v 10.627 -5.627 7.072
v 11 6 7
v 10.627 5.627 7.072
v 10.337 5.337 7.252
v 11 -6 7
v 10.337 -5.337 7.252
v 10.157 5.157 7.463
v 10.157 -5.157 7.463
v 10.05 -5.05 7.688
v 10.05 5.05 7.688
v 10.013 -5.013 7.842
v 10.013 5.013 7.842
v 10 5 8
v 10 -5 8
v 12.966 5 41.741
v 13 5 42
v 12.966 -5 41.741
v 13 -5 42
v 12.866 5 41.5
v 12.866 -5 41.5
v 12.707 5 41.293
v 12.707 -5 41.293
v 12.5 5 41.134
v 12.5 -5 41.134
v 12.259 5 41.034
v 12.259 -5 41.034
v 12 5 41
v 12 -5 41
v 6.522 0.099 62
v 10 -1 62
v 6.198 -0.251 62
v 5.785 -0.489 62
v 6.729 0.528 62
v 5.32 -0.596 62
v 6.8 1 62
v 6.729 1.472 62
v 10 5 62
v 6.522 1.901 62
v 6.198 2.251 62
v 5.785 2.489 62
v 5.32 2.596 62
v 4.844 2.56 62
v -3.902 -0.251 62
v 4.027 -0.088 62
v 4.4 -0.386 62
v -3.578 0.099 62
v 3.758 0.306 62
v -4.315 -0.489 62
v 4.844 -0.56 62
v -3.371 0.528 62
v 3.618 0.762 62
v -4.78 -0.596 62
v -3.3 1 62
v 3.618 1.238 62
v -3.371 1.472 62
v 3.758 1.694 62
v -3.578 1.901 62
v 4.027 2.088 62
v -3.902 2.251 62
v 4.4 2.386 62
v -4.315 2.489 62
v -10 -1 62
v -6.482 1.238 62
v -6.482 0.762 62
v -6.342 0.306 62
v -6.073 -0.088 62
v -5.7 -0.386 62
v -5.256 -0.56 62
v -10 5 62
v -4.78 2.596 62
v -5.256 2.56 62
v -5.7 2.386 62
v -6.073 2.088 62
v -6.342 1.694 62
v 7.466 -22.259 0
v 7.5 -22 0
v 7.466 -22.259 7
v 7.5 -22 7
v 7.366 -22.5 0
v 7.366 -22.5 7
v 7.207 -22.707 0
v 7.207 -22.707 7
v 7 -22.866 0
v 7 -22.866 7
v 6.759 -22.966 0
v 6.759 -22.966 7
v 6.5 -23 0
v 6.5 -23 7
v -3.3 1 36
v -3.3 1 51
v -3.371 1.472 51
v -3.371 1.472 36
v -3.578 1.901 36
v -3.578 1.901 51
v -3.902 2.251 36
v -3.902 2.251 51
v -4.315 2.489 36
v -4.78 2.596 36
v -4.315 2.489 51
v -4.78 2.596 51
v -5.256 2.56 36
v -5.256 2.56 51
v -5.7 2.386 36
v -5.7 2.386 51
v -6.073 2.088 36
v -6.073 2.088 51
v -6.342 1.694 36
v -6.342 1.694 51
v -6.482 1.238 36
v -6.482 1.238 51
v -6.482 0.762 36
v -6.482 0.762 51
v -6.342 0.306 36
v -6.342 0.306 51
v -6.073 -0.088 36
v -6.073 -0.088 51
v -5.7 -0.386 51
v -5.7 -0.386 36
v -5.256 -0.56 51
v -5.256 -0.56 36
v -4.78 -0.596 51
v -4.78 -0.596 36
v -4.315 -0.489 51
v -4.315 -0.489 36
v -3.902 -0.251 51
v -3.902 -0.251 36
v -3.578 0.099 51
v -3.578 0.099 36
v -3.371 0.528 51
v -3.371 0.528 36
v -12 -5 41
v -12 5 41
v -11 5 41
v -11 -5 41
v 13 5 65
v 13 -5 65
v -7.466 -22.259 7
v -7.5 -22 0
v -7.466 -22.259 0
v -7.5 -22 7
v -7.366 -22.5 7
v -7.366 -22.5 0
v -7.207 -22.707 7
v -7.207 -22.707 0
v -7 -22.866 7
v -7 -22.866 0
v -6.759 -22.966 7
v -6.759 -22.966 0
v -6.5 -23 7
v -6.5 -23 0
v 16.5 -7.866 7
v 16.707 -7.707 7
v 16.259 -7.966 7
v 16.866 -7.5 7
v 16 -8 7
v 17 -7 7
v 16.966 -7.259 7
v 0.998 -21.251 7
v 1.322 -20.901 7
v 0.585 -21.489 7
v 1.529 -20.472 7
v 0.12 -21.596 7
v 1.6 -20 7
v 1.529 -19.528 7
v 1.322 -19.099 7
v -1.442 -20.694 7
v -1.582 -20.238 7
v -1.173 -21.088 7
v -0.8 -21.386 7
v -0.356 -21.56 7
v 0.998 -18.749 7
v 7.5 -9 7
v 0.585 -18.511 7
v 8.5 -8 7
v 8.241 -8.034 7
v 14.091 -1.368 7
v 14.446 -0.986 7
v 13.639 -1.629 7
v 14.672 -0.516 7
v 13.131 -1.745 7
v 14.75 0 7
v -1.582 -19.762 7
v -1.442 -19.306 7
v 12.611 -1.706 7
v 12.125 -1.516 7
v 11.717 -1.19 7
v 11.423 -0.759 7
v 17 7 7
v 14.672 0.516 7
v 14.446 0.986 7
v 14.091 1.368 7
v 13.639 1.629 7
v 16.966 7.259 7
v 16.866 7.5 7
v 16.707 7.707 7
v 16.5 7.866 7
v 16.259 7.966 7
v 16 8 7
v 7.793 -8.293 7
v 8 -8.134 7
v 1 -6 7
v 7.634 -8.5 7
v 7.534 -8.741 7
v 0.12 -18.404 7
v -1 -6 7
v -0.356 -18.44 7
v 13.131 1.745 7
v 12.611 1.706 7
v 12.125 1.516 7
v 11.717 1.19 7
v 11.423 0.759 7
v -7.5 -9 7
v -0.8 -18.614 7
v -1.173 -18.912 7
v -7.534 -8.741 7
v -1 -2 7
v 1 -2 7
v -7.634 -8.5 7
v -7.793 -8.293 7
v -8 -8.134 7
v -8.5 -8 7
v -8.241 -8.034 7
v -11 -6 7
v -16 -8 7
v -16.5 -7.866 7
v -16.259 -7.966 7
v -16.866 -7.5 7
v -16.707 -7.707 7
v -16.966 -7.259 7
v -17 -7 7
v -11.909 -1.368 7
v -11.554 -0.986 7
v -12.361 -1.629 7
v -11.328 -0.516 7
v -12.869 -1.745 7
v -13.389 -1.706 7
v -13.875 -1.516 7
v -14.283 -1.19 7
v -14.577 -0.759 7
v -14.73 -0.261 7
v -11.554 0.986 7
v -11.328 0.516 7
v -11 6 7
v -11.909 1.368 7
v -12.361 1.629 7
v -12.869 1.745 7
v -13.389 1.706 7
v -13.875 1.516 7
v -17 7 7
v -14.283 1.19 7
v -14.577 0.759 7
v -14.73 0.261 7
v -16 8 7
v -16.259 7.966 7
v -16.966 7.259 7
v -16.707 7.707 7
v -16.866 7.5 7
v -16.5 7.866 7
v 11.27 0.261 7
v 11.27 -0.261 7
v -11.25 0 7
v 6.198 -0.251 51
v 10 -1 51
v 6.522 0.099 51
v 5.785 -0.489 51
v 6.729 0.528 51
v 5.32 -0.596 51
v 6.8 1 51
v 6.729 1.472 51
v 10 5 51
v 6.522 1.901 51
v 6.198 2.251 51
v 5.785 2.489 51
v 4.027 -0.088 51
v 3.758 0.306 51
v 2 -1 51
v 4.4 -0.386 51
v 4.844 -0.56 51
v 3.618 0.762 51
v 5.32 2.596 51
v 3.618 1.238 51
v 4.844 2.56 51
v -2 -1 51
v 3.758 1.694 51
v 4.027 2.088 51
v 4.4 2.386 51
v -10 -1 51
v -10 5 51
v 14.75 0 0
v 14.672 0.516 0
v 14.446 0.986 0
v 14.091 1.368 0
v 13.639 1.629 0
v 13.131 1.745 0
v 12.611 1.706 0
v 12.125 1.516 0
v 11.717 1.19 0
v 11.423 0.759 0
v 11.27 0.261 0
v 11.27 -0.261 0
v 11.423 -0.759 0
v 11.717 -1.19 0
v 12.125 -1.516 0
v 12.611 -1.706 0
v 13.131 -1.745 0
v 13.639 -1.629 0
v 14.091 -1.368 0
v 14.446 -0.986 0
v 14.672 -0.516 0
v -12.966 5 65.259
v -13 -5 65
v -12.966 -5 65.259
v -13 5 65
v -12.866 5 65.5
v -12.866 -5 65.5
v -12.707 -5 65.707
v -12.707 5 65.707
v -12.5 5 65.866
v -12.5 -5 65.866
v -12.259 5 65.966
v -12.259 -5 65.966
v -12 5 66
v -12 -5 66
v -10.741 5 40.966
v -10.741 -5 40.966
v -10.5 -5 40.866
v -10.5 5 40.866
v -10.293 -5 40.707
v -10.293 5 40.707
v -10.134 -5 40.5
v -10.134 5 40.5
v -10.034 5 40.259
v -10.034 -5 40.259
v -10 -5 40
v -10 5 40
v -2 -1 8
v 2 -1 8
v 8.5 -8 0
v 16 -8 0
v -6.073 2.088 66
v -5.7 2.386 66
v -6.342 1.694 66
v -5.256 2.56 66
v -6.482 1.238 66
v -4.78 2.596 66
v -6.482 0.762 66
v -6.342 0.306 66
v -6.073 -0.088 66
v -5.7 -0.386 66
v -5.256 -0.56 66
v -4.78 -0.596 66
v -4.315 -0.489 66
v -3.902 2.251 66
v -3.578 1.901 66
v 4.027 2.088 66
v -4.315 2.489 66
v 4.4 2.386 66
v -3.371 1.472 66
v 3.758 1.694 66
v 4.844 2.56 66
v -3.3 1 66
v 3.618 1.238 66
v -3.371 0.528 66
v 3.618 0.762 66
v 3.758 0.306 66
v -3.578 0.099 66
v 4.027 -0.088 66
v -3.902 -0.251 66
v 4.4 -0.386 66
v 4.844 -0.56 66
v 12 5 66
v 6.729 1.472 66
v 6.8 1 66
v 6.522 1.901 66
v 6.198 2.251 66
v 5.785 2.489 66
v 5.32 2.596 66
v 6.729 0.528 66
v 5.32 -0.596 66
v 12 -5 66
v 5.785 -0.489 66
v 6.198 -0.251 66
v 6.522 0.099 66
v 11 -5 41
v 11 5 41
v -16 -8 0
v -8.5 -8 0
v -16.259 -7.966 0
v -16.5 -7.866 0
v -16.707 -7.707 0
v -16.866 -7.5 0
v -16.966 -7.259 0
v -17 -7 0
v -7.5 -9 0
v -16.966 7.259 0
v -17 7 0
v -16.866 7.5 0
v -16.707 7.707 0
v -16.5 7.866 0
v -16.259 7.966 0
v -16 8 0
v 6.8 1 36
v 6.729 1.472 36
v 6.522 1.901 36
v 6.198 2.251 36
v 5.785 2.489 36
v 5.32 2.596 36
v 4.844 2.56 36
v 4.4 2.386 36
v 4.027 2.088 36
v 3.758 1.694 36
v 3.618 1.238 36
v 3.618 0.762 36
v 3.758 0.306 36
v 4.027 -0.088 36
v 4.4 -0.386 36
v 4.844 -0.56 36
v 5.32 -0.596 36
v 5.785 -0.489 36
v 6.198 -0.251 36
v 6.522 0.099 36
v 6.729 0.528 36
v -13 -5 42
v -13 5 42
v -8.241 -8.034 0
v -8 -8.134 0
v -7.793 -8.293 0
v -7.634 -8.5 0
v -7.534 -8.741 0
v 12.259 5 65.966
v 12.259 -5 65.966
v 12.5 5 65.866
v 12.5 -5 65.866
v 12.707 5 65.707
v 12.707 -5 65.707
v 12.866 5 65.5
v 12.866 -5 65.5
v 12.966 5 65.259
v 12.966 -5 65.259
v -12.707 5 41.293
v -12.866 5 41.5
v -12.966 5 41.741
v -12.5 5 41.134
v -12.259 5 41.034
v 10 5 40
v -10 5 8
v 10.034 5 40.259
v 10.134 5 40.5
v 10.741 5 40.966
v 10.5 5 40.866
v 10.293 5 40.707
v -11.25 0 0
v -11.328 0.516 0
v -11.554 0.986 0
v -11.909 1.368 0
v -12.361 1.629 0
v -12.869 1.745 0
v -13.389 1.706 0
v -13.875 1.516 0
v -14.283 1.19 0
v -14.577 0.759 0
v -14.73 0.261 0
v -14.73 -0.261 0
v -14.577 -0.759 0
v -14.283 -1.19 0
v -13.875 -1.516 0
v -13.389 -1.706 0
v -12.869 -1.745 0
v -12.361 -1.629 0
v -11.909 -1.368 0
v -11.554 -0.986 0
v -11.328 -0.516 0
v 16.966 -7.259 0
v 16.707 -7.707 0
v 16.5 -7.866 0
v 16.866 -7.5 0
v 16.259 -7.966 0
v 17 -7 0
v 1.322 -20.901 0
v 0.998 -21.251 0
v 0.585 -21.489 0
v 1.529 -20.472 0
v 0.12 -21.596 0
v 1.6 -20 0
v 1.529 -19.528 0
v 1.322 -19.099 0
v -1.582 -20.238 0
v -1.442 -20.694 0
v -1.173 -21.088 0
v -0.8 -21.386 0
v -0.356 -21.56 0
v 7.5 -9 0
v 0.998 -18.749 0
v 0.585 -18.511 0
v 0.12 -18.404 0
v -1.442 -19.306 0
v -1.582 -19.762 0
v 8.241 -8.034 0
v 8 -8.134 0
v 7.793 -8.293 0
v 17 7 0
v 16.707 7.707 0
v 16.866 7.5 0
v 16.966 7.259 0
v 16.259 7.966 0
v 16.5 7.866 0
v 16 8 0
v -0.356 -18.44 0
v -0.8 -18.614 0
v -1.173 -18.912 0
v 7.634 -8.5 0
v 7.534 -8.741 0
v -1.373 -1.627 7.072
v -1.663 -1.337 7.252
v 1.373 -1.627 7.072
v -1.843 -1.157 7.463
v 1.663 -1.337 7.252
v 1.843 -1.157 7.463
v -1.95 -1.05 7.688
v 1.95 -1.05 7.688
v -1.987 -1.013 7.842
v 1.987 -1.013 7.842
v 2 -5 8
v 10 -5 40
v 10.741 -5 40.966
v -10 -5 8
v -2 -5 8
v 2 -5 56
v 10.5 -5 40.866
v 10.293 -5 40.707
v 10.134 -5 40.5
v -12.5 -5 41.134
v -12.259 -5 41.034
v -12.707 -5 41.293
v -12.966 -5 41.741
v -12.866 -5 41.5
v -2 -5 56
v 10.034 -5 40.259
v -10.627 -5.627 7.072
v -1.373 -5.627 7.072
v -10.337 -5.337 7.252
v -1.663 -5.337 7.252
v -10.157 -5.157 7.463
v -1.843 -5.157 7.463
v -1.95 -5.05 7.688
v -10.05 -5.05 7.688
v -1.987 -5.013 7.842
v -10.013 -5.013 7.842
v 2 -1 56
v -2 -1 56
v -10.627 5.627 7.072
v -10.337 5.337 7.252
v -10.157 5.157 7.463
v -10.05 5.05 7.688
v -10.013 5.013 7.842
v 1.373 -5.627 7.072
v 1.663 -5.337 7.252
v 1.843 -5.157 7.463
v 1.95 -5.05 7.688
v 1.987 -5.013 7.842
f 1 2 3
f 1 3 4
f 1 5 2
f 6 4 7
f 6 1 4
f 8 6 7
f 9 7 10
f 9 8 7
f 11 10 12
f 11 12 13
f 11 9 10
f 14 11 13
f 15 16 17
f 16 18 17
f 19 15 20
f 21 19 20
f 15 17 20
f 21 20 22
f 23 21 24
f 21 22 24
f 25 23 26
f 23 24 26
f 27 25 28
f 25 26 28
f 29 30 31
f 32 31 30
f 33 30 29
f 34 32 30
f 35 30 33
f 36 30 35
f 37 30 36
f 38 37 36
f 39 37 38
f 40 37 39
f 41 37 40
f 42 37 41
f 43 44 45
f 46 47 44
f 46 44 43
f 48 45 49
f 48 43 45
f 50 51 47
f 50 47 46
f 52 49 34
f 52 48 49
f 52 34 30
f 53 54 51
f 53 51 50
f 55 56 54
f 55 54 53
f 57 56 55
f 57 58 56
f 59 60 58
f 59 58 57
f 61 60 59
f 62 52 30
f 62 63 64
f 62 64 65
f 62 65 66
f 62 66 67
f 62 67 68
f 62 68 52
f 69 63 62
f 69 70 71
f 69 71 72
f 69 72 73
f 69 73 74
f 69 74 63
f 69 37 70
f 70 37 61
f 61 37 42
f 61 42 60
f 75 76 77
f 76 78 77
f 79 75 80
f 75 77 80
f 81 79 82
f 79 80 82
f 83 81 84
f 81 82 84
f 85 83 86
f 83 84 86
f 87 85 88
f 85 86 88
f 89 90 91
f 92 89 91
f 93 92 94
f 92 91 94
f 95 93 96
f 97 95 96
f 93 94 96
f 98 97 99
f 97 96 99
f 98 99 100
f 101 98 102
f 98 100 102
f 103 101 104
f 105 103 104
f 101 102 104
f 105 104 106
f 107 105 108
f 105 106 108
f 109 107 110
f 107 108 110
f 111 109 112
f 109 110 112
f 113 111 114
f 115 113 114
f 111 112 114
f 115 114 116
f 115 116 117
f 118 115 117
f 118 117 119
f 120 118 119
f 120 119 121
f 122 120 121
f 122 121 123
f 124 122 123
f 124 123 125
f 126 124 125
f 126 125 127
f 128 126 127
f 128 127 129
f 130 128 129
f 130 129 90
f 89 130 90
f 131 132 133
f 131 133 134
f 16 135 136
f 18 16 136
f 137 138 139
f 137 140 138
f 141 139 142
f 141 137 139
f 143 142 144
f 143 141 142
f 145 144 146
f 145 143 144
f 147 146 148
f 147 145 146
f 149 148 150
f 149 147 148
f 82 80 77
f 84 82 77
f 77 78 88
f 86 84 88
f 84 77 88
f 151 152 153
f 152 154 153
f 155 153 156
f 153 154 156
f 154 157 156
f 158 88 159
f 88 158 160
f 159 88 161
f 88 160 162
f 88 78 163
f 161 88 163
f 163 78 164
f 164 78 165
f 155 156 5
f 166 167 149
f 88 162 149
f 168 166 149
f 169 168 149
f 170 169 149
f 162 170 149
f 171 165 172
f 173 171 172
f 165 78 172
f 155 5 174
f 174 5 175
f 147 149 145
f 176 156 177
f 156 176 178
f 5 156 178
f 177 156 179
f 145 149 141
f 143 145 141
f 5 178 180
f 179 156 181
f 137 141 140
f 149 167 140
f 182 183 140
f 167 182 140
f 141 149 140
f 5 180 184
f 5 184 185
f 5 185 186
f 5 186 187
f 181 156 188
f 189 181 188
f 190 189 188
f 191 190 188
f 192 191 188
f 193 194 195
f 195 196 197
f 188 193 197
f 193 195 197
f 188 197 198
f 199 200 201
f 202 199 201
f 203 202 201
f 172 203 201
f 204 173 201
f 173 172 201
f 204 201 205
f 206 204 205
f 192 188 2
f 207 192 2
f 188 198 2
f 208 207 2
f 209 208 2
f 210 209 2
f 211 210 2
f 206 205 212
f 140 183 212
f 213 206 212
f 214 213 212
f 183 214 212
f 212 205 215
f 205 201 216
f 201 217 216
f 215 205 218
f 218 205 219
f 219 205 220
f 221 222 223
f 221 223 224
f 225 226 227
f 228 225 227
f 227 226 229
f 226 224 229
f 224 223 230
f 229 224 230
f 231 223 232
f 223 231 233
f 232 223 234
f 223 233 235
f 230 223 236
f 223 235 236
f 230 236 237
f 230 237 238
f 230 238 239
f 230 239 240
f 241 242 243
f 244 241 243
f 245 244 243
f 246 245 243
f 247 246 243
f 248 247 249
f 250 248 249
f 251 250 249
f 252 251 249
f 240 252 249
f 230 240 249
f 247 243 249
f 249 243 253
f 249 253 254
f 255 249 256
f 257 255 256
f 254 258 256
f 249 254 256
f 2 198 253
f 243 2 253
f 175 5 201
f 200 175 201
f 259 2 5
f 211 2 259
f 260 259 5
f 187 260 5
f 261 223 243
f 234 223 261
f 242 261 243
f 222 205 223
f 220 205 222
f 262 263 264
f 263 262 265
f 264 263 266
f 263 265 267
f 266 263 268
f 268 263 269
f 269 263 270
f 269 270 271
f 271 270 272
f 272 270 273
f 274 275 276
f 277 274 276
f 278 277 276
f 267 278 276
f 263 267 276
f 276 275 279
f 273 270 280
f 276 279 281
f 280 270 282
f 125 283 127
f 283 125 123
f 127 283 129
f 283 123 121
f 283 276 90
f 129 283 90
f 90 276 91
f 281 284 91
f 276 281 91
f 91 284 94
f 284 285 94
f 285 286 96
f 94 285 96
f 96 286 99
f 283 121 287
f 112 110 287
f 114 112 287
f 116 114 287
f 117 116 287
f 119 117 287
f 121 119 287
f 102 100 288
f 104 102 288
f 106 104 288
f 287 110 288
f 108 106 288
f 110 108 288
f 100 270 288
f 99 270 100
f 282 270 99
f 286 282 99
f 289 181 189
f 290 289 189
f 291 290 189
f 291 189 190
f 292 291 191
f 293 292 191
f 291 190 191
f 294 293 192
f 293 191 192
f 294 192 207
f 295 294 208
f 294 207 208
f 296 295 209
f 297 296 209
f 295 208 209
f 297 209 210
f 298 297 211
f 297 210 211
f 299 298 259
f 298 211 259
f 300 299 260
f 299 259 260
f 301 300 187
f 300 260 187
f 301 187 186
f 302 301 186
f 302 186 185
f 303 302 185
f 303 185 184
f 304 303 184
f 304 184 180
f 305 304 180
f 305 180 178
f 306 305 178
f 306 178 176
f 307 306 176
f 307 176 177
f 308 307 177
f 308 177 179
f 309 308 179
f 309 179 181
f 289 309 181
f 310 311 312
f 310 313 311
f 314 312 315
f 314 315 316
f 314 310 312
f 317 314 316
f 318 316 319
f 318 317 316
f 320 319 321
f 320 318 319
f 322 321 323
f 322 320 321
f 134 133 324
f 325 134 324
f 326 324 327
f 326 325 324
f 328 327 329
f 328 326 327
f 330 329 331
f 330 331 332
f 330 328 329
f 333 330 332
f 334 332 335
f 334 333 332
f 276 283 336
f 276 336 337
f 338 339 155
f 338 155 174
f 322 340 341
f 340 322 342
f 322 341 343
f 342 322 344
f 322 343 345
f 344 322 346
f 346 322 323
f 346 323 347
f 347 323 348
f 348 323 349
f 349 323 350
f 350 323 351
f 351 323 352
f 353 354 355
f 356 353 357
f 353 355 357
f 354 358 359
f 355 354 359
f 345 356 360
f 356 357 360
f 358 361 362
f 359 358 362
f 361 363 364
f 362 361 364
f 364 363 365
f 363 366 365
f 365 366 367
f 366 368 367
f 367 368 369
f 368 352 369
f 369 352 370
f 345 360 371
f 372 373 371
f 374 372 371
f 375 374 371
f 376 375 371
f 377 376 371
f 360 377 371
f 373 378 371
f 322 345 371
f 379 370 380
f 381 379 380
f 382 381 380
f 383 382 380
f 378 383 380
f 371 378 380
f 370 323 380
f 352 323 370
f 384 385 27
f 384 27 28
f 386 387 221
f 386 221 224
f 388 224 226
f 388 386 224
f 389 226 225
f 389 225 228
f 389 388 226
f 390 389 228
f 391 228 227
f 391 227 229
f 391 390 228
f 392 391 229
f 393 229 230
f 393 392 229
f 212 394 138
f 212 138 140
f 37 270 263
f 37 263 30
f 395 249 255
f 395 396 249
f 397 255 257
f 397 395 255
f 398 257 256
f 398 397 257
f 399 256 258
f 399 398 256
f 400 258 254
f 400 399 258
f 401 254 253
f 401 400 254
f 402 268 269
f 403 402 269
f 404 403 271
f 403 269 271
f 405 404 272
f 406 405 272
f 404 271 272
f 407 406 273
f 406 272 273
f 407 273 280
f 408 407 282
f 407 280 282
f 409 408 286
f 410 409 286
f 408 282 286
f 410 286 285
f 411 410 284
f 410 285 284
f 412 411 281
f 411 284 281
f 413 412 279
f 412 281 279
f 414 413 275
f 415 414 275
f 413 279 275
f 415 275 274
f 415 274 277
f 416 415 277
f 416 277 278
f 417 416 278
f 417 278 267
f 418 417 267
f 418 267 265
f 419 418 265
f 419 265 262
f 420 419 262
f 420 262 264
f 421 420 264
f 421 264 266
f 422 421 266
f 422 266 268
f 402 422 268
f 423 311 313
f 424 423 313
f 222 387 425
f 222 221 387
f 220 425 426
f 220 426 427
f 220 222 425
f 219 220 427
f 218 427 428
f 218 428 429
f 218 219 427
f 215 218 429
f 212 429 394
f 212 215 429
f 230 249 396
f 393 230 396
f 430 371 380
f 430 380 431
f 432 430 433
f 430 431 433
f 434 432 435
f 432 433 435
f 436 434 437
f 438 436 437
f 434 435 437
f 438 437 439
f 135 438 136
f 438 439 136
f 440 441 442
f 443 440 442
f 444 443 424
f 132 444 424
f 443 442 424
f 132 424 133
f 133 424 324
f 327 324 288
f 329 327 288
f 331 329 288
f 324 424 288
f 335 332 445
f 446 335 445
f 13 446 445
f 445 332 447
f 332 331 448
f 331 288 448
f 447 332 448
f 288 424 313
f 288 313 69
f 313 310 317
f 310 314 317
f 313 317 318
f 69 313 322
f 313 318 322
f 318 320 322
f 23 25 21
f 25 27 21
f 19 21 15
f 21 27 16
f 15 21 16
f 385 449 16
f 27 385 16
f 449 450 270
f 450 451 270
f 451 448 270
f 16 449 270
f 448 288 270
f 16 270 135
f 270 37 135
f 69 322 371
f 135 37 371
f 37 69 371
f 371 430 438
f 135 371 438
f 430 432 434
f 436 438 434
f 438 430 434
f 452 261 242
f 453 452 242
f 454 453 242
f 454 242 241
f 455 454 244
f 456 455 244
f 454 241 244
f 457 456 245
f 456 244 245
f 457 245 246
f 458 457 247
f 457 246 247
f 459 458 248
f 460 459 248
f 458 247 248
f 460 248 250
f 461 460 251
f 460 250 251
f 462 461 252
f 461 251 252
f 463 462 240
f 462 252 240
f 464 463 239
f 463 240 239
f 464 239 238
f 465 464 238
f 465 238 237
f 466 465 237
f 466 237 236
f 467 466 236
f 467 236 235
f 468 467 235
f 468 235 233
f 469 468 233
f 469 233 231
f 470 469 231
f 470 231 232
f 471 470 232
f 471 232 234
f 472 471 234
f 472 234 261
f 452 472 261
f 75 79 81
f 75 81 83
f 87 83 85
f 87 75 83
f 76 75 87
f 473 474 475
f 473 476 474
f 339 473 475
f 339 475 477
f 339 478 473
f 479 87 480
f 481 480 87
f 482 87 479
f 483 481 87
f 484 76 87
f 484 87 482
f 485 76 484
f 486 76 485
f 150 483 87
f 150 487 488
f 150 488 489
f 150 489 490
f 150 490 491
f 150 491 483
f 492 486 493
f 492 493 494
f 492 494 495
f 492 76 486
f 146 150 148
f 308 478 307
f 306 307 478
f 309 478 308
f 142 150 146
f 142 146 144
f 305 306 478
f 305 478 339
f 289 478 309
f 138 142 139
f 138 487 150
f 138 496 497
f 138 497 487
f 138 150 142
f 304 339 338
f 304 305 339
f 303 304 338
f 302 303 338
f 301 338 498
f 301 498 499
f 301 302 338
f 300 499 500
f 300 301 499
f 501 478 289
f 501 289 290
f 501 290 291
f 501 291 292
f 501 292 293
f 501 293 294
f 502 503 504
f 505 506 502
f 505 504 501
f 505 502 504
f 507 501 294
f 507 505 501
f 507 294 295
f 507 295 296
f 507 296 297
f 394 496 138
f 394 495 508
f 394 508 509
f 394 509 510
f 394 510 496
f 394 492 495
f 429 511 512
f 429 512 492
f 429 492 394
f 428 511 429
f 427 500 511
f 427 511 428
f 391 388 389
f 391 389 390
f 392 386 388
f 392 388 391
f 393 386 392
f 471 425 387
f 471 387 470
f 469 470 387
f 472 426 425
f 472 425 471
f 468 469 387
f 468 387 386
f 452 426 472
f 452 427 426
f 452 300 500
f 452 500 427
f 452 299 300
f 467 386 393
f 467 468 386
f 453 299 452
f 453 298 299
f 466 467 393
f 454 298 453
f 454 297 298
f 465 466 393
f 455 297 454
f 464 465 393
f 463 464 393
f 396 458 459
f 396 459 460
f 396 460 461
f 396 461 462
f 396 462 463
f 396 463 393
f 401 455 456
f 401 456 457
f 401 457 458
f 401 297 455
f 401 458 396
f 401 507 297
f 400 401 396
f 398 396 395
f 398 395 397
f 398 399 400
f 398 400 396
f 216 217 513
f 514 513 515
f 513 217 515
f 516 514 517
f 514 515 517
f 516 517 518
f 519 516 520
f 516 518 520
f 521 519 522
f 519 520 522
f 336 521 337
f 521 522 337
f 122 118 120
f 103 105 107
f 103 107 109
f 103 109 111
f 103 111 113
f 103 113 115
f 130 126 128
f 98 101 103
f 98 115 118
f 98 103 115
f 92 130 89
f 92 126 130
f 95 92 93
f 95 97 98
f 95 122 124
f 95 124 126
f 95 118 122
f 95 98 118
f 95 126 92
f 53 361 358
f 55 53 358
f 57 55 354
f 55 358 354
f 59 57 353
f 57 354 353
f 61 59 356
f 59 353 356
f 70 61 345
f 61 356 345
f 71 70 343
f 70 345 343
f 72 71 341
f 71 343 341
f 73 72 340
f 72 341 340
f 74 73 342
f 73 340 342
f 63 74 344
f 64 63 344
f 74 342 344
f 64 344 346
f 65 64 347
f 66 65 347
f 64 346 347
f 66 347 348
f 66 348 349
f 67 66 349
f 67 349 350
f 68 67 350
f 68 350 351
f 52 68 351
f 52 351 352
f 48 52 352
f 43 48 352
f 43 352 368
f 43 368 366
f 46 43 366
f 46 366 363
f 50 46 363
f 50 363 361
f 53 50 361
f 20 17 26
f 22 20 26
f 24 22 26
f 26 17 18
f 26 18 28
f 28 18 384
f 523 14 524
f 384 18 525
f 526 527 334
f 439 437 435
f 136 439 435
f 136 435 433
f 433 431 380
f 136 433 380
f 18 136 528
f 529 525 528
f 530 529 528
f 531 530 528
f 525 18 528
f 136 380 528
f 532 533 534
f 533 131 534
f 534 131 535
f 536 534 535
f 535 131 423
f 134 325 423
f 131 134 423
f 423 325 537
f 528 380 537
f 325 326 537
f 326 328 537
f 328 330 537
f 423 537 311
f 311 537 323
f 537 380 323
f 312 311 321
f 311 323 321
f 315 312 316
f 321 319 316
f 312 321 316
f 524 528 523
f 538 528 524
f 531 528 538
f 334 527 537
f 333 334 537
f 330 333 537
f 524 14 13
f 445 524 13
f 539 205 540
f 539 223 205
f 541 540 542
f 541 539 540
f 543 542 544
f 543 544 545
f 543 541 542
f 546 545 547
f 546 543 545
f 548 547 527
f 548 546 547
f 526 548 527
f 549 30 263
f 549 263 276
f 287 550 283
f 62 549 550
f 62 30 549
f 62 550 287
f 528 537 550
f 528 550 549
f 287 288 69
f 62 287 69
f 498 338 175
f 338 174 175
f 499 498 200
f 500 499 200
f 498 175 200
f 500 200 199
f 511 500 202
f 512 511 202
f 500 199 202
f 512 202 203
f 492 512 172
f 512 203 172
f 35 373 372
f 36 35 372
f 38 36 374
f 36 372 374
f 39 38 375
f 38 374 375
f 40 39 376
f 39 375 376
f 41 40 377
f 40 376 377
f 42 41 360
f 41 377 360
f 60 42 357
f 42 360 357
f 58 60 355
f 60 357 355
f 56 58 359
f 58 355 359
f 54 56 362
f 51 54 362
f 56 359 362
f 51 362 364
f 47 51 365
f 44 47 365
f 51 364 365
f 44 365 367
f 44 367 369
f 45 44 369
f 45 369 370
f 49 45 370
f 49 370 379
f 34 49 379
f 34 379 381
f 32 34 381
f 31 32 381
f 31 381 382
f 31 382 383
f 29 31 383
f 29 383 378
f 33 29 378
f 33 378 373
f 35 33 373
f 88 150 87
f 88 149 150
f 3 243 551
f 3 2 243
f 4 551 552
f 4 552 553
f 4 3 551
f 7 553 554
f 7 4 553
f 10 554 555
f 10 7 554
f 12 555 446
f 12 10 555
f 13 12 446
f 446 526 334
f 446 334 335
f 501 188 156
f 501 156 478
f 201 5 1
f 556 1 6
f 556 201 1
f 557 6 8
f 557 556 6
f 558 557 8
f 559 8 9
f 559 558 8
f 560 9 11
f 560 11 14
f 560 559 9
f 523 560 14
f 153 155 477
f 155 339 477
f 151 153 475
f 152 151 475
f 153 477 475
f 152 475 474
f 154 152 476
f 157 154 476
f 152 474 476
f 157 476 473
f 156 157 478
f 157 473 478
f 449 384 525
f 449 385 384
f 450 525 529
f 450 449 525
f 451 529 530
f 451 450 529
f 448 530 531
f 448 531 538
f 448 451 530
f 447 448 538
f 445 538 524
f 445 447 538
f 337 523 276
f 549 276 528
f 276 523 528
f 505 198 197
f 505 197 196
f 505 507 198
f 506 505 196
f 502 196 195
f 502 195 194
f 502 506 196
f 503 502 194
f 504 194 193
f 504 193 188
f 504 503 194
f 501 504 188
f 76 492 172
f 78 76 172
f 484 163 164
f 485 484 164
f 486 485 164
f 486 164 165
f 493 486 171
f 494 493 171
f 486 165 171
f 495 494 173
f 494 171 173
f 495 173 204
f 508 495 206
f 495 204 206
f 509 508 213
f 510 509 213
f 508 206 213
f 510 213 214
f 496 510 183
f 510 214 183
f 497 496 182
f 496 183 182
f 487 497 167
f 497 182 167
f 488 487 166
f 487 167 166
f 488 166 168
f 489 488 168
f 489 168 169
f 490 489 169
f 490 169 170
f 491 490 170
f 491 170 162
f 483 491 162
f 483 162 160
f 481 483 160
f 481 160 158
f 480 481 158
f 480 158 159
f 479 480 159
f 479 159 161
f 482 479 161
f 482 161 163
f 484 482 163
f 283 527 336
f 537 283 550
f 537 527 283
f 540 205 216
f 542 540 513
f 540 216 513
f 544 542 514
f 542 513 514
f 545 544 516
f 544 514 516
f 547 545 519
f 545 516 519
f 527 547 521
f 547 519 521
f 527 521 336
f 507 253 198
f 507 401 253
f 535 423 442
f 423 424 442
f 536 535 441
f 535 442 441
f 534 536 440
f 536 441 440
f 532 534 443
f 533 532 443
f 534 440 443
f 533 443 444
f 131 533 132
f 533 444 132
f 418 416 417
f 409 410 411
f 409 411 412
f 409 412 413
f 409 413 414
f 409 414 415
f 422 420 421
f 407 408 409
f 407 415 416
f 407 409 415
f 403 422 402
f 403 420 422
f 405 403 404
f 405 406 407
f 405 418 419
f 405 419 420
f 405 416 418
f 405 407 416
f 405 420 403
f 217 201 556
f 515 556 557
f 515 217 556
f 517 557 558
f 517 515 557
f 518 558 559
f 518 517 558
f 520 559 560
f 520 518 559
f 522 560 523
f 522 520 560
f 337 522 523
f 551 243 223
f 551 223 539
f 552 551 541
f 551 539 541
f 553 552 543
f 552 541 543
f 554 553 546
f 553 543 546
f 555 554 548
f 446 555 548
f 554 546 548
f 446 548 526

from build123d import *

# Parameters (mm, degrees)
SKETCH_W           = 20
SKETCH_H           = 10
PAD_DEPTH          = 60
SKETCH001_W        = 50
SKETCH001_H        = 10
PAD001_DEPTH       = 10
PAD001_FACE6_W     = 10
PAD001_FACE6_H     = 15
PAD002_DEPTH       = 5
PAD002_FACE5_W     = 10
PAD002_FACE5_H     = 15
PAD003_DEPTH       = 5
SKETCH002_W        = 20
SKETCH002_H        = 11
POCKET_DEPTH       = 6
PAD004_DEPTH       = 10
PAD005_DEPTH       = 10
PAD005_FACE15_W    = 10
PAD005_FACE15_H    = 25
POCKET001_DEPTH    = 12
POCKET001_FACE3_W  = 10
POCKET001_FACE3_H  = 25
POCKET002_DEPTH    = 12
SKETCH003_W        = 4
SKETCH003_H        = 56
POCKET003_DEPTH    = 4
SKETCH004_R        = 1.6
POCKET004_DEPTH    = 30
SKETCH005_W        = 30
SKETCH005_H        = 12
PAD006_DEPTH       = 7
SKETCH006_R        = 1.75
POCKET005_DEPTH    = 9
POCKET005_FACE23_W = 12
POCKET005_FACE23_H = 7
PAD007_DEPTH       = 2
PAD007_FACE1_W     = 12
PAD007_FACE1_H     = 7
PAD008_DEPTH       = 2
FILLET_R           = 1
FILLET_FACE10_W    = 34
FILLET_FACE10_H    = 7
PAD009_DEPTH       = 2
PAD009_FACE3_W     = 34
PAD009_FACE3_H     = 7
PAD010_DEPTH       = 2
FILLET001_R        = 1
FILLET002_R        = 1
FILLET003_R        = 1
SKETCH007_W        = 15
SKETCH007_H        = 7
PAD011_DEPTH       = 15
FILLET004_R        = 1
SKETCH008_R        = 1.6
POCKET006_DEPTH    = 10


with BuildPart() as part:
    # Sketch → Pad (new body)
    with BuildSketch(Plane.XY):
        Rectangle(SKETCH_W, SKETCH_H)
    extrude(amount=PAD_DEPTH)

    # Sketch001 (on Face2 of Pad) → Pad001 (join)
    with BuildSketch(Plane.XZ.offset(5)):
        with Locations((0, 61)):
            Rectangle(SKETCH001_W, SKETCH001_H)
    extrude(amount=-PAD001_DEPTH)

    # Pad001 Face6 → Pad002 (add)
    with BuildSketch(Plane(origin=(17.5, 0, 56), x_dir=(0, -1, 0), z_dir=(0, 0, -1))):
        Rectangle(PAD001_FACE6_W, PAD001_FACE6_H)
    extrude(amount=PAD002_DEPTH)

    # Pad002 Face5 → Pad003 (add)
    with BuildSketch(Plane(origin=(-17.5, 0, 56), x_dir=(0, -1, 0), z_dir=(0, 0, -1))):
        Rectangle(PAD002_FACE5_W, PAD002_FACE5_H)
    extrude(amount=PAD003_DEPTH)

    # Sketch002 (on Face10 of Pad003) → Pocket (cut)
    with BuildSketch(Plane(origin=(0, 5, 0), x_dir=(-1, 0, 0), z_dir=(0, 1, 0))):
        with Locations((0, 56.5)):
            Rectangle(SKETCH002_W, SKETCH002_H)
    extrude(amount=-POCKET_DEPTH, mode=Mode.SUBTRACT)

    # Pocket Face6 → Pad004 (add)
    with BuildSketch(Plane(origin=(-17.5, 0, 51), x_dir=(0, -1, 0), z_dir=(0, 0, -1))):
        Polygon((5, -7.5), (5, 7.5), (-5, 7.5), (-5, -7.5), (1, -7.5), align=None)
    extrude(amount=PAD004_DEPTH)

    # Pad004 Face5 → Pad005 (add)
    with BuildSketch(Plane(origin=(17.5, 0, 51), x_dir=(0, -1, 0), z_dir=(0, 0, -1))):
        Polygon((5, -7.5), (5, 7.5), (1, 7.5), (-5, 7.5), (-5, -7.5), align=None)
    extrude(amount=PAD005_DEPTH)

    # Pad005 Face15 → Pocket001 (cut)
    with BuildSketch(Plane(origin=(25, 0, 53.5), x_dir=(0, -1, 0), z_dir=(1, 0, 0))):
        Rectangle(PAD005_FACE15_W, PAD005_FACE15_H)
    extrude(amount=-POCKET001_DEPTH, mode=Mode.SUBTRACT)

    # Pocket001 Face3 → Pocket002 (cut)
    with BuildSketch(Plane(origin=(-25, 0, 53.5), x_dir=(0, 1, 0), z_dir=(-1, 0, 0))):
        Rectangle(POCKET001_FACE3_W, POCKET001_FACE3_H)
    extrude(amount=-POCKET002_DEPTH, mode=Mode.SUBTRACT)

    # Sketch003 (on Face2 of Pocket002) → Pocket003 (cut)
    with BuildSketch(Plane.XZ.offset(5)):
        with Locations((0, 28)):
            Rectangle(SKETCH003_W, SKETCH003_H)
    extrude(amount=-POCKET003_DEPTH, mode=Mode.SUBTRACT)

    # Sketch004 (on Face1 of Pocket003) → Pocket004 (cut)
    with BuildSketch(Plane.XY.offset(66)):
        with Locations((-4.9, 1)):
            Circle(SKETCH004_R)
        with Locations((5.2, 1)):
            Circle(SKETCH004_R)
    extrude(amount=-POCKET004_DEPTH, mode=Mode.SUBTRACT)

    # Sketch005 (on Face12 of Pocket004) → Pad006 (join)
    with BuildSketch(Plane(origin=(0, 0, 0), x_dir=(1, 0, 0), z_dir=(0, 0, -1))):
        Rectangle(SKETCH005_W, SKETCH005_H)
    extrude(amount=-PAD006_DEPTH)

    # Sketch006 (on Face12 of Pad006) → Pocket005 (cut)
    with BuildSketch(Plane.XY.offset(7)):
        with Locations((13, 0)):
            Circle(SKETCH006_R)
        with Locations((-13, 0)):
            Circle(SKETCH006_R)
    extrude(amount=-POCKET005_DEPTH, mode=Mode.SUBTRACT)

    # Pocket005 Face23 → Pad007 (add)
    with BuildSketch(Plane(origin=(15, 0, 3.5), x_dir=(0, -1, 0), z_dir=(1, 0, 0))):
        Rectangle(POCKET005_FACE23_W, POCKET005_FACE23_H)
    extrude(amount=PAD007_DEPTH)

    # Pad007 Face1 → Pad008 (add)
    with BuildSketch(Plane(origin=(-15, 0, 3.5), x_dir=(0, 1, 0), z_dir=(-1, 0, 0))):
        Rectangle(PAD007_FACE1_W, PAD007_FACE1_H)
    extrude(amount=PAD008_DEPTH)

    # Fillet
    fillet_edges = [part.edges().sort_by_distance(p)[0] for p in [
        (0, -1, 7),
        (-2, -3, 7),
        (2, -3, 7),
    ]]
    fillet(fillet_edges, radius=FILLET_R)

    # Fillet Face10 → Pad009 (add)
    with BuildSketch(Plane(origin=(0, 6, 3.5), x_dir=(1, 0, 0), z_dir=(0, 1, 0))):
        Rectangle(FILLET_FACE10_W, FILLET_FACE10_H)
    extrude(amount=PAD009_DEPTH)

    # Pad009 Face3 → Pad010 (add)
    with BuildSketch(Plane(origin=(0, -6, 3.5), x_dir=(-1, 0, 0), z_dir=(0, -1, 0))):
        Rectangle(PAD009_FACE3_W, PAD009_FACE3_H)
    extrude(amount=PAD010_DEPTH)

    # Fillet001
    fillet001_edges = [part.edges().sort_by_distance(p)[0] for p in [
        (0, 5, 7),
        (-10, 0, 7),
        (10, 0, 7),
        (5.5, -5, 7),
        (-5.5, -5, 7),
    ]]
    fillet(fillet001_edges, radius=FILLET001_R)

    # Fillet002
    fillet002_edges = [part.edges().sort_by_distance(p)[0] for p in [
        (10, 0, 41),
        (13, 0, 41),
        (-10, 0, 41),
        (-13, 0, 41),
    ]]
    fillet(fillet002_edges, radius=FILLET002_R)

    # Fillet003
    fillet003_edges = [part.edges().sort_by_distance(p)[0] for p in [
        (-13, 0, 66),
        (13, 0, 66),
        (-17, 8, 3.5),
        (-17, -8, 3.5),
        (17, 8, 3.5),
        (17, -8, 3.5),
    ]]
    fillet(fillet003_edges, radius=FILLET003_R)

    # Sketch007 (on Face42 of Fillet003) → Pad011 (join)
    with BuildSketch(Plane.XZ.offset(8)):
        with Locations((0, 3.5)):
            Rectangle(SKETCH007_W, SKETCH007_H)
    extrude(amount=PAD011_DEPTH)

    # Fillet004
    fillet004_edges = [part.edges().sort_by_distance(p)[0] for p in [
        (-7.5, -23, 3.5),
        (7.5, -23, 3.5),
        (-7.5, -8, 3.5),
        (7.5, -8, 3.5),
    ]]
    fillet(fillet004_edges, radius=FILLET004_R)

    # Sketch008 (on Face5 of Fillet004) → Pocket006 (cut)
    with BuildSketch(Plane.XY.offset(7)):
        with Locations((0, -20)):
            Circle(SKETCH008_R)
    extrude(amount=-POCKET006_DEPTH, mode=Mode.SUBTRACT)


solid = part.part
